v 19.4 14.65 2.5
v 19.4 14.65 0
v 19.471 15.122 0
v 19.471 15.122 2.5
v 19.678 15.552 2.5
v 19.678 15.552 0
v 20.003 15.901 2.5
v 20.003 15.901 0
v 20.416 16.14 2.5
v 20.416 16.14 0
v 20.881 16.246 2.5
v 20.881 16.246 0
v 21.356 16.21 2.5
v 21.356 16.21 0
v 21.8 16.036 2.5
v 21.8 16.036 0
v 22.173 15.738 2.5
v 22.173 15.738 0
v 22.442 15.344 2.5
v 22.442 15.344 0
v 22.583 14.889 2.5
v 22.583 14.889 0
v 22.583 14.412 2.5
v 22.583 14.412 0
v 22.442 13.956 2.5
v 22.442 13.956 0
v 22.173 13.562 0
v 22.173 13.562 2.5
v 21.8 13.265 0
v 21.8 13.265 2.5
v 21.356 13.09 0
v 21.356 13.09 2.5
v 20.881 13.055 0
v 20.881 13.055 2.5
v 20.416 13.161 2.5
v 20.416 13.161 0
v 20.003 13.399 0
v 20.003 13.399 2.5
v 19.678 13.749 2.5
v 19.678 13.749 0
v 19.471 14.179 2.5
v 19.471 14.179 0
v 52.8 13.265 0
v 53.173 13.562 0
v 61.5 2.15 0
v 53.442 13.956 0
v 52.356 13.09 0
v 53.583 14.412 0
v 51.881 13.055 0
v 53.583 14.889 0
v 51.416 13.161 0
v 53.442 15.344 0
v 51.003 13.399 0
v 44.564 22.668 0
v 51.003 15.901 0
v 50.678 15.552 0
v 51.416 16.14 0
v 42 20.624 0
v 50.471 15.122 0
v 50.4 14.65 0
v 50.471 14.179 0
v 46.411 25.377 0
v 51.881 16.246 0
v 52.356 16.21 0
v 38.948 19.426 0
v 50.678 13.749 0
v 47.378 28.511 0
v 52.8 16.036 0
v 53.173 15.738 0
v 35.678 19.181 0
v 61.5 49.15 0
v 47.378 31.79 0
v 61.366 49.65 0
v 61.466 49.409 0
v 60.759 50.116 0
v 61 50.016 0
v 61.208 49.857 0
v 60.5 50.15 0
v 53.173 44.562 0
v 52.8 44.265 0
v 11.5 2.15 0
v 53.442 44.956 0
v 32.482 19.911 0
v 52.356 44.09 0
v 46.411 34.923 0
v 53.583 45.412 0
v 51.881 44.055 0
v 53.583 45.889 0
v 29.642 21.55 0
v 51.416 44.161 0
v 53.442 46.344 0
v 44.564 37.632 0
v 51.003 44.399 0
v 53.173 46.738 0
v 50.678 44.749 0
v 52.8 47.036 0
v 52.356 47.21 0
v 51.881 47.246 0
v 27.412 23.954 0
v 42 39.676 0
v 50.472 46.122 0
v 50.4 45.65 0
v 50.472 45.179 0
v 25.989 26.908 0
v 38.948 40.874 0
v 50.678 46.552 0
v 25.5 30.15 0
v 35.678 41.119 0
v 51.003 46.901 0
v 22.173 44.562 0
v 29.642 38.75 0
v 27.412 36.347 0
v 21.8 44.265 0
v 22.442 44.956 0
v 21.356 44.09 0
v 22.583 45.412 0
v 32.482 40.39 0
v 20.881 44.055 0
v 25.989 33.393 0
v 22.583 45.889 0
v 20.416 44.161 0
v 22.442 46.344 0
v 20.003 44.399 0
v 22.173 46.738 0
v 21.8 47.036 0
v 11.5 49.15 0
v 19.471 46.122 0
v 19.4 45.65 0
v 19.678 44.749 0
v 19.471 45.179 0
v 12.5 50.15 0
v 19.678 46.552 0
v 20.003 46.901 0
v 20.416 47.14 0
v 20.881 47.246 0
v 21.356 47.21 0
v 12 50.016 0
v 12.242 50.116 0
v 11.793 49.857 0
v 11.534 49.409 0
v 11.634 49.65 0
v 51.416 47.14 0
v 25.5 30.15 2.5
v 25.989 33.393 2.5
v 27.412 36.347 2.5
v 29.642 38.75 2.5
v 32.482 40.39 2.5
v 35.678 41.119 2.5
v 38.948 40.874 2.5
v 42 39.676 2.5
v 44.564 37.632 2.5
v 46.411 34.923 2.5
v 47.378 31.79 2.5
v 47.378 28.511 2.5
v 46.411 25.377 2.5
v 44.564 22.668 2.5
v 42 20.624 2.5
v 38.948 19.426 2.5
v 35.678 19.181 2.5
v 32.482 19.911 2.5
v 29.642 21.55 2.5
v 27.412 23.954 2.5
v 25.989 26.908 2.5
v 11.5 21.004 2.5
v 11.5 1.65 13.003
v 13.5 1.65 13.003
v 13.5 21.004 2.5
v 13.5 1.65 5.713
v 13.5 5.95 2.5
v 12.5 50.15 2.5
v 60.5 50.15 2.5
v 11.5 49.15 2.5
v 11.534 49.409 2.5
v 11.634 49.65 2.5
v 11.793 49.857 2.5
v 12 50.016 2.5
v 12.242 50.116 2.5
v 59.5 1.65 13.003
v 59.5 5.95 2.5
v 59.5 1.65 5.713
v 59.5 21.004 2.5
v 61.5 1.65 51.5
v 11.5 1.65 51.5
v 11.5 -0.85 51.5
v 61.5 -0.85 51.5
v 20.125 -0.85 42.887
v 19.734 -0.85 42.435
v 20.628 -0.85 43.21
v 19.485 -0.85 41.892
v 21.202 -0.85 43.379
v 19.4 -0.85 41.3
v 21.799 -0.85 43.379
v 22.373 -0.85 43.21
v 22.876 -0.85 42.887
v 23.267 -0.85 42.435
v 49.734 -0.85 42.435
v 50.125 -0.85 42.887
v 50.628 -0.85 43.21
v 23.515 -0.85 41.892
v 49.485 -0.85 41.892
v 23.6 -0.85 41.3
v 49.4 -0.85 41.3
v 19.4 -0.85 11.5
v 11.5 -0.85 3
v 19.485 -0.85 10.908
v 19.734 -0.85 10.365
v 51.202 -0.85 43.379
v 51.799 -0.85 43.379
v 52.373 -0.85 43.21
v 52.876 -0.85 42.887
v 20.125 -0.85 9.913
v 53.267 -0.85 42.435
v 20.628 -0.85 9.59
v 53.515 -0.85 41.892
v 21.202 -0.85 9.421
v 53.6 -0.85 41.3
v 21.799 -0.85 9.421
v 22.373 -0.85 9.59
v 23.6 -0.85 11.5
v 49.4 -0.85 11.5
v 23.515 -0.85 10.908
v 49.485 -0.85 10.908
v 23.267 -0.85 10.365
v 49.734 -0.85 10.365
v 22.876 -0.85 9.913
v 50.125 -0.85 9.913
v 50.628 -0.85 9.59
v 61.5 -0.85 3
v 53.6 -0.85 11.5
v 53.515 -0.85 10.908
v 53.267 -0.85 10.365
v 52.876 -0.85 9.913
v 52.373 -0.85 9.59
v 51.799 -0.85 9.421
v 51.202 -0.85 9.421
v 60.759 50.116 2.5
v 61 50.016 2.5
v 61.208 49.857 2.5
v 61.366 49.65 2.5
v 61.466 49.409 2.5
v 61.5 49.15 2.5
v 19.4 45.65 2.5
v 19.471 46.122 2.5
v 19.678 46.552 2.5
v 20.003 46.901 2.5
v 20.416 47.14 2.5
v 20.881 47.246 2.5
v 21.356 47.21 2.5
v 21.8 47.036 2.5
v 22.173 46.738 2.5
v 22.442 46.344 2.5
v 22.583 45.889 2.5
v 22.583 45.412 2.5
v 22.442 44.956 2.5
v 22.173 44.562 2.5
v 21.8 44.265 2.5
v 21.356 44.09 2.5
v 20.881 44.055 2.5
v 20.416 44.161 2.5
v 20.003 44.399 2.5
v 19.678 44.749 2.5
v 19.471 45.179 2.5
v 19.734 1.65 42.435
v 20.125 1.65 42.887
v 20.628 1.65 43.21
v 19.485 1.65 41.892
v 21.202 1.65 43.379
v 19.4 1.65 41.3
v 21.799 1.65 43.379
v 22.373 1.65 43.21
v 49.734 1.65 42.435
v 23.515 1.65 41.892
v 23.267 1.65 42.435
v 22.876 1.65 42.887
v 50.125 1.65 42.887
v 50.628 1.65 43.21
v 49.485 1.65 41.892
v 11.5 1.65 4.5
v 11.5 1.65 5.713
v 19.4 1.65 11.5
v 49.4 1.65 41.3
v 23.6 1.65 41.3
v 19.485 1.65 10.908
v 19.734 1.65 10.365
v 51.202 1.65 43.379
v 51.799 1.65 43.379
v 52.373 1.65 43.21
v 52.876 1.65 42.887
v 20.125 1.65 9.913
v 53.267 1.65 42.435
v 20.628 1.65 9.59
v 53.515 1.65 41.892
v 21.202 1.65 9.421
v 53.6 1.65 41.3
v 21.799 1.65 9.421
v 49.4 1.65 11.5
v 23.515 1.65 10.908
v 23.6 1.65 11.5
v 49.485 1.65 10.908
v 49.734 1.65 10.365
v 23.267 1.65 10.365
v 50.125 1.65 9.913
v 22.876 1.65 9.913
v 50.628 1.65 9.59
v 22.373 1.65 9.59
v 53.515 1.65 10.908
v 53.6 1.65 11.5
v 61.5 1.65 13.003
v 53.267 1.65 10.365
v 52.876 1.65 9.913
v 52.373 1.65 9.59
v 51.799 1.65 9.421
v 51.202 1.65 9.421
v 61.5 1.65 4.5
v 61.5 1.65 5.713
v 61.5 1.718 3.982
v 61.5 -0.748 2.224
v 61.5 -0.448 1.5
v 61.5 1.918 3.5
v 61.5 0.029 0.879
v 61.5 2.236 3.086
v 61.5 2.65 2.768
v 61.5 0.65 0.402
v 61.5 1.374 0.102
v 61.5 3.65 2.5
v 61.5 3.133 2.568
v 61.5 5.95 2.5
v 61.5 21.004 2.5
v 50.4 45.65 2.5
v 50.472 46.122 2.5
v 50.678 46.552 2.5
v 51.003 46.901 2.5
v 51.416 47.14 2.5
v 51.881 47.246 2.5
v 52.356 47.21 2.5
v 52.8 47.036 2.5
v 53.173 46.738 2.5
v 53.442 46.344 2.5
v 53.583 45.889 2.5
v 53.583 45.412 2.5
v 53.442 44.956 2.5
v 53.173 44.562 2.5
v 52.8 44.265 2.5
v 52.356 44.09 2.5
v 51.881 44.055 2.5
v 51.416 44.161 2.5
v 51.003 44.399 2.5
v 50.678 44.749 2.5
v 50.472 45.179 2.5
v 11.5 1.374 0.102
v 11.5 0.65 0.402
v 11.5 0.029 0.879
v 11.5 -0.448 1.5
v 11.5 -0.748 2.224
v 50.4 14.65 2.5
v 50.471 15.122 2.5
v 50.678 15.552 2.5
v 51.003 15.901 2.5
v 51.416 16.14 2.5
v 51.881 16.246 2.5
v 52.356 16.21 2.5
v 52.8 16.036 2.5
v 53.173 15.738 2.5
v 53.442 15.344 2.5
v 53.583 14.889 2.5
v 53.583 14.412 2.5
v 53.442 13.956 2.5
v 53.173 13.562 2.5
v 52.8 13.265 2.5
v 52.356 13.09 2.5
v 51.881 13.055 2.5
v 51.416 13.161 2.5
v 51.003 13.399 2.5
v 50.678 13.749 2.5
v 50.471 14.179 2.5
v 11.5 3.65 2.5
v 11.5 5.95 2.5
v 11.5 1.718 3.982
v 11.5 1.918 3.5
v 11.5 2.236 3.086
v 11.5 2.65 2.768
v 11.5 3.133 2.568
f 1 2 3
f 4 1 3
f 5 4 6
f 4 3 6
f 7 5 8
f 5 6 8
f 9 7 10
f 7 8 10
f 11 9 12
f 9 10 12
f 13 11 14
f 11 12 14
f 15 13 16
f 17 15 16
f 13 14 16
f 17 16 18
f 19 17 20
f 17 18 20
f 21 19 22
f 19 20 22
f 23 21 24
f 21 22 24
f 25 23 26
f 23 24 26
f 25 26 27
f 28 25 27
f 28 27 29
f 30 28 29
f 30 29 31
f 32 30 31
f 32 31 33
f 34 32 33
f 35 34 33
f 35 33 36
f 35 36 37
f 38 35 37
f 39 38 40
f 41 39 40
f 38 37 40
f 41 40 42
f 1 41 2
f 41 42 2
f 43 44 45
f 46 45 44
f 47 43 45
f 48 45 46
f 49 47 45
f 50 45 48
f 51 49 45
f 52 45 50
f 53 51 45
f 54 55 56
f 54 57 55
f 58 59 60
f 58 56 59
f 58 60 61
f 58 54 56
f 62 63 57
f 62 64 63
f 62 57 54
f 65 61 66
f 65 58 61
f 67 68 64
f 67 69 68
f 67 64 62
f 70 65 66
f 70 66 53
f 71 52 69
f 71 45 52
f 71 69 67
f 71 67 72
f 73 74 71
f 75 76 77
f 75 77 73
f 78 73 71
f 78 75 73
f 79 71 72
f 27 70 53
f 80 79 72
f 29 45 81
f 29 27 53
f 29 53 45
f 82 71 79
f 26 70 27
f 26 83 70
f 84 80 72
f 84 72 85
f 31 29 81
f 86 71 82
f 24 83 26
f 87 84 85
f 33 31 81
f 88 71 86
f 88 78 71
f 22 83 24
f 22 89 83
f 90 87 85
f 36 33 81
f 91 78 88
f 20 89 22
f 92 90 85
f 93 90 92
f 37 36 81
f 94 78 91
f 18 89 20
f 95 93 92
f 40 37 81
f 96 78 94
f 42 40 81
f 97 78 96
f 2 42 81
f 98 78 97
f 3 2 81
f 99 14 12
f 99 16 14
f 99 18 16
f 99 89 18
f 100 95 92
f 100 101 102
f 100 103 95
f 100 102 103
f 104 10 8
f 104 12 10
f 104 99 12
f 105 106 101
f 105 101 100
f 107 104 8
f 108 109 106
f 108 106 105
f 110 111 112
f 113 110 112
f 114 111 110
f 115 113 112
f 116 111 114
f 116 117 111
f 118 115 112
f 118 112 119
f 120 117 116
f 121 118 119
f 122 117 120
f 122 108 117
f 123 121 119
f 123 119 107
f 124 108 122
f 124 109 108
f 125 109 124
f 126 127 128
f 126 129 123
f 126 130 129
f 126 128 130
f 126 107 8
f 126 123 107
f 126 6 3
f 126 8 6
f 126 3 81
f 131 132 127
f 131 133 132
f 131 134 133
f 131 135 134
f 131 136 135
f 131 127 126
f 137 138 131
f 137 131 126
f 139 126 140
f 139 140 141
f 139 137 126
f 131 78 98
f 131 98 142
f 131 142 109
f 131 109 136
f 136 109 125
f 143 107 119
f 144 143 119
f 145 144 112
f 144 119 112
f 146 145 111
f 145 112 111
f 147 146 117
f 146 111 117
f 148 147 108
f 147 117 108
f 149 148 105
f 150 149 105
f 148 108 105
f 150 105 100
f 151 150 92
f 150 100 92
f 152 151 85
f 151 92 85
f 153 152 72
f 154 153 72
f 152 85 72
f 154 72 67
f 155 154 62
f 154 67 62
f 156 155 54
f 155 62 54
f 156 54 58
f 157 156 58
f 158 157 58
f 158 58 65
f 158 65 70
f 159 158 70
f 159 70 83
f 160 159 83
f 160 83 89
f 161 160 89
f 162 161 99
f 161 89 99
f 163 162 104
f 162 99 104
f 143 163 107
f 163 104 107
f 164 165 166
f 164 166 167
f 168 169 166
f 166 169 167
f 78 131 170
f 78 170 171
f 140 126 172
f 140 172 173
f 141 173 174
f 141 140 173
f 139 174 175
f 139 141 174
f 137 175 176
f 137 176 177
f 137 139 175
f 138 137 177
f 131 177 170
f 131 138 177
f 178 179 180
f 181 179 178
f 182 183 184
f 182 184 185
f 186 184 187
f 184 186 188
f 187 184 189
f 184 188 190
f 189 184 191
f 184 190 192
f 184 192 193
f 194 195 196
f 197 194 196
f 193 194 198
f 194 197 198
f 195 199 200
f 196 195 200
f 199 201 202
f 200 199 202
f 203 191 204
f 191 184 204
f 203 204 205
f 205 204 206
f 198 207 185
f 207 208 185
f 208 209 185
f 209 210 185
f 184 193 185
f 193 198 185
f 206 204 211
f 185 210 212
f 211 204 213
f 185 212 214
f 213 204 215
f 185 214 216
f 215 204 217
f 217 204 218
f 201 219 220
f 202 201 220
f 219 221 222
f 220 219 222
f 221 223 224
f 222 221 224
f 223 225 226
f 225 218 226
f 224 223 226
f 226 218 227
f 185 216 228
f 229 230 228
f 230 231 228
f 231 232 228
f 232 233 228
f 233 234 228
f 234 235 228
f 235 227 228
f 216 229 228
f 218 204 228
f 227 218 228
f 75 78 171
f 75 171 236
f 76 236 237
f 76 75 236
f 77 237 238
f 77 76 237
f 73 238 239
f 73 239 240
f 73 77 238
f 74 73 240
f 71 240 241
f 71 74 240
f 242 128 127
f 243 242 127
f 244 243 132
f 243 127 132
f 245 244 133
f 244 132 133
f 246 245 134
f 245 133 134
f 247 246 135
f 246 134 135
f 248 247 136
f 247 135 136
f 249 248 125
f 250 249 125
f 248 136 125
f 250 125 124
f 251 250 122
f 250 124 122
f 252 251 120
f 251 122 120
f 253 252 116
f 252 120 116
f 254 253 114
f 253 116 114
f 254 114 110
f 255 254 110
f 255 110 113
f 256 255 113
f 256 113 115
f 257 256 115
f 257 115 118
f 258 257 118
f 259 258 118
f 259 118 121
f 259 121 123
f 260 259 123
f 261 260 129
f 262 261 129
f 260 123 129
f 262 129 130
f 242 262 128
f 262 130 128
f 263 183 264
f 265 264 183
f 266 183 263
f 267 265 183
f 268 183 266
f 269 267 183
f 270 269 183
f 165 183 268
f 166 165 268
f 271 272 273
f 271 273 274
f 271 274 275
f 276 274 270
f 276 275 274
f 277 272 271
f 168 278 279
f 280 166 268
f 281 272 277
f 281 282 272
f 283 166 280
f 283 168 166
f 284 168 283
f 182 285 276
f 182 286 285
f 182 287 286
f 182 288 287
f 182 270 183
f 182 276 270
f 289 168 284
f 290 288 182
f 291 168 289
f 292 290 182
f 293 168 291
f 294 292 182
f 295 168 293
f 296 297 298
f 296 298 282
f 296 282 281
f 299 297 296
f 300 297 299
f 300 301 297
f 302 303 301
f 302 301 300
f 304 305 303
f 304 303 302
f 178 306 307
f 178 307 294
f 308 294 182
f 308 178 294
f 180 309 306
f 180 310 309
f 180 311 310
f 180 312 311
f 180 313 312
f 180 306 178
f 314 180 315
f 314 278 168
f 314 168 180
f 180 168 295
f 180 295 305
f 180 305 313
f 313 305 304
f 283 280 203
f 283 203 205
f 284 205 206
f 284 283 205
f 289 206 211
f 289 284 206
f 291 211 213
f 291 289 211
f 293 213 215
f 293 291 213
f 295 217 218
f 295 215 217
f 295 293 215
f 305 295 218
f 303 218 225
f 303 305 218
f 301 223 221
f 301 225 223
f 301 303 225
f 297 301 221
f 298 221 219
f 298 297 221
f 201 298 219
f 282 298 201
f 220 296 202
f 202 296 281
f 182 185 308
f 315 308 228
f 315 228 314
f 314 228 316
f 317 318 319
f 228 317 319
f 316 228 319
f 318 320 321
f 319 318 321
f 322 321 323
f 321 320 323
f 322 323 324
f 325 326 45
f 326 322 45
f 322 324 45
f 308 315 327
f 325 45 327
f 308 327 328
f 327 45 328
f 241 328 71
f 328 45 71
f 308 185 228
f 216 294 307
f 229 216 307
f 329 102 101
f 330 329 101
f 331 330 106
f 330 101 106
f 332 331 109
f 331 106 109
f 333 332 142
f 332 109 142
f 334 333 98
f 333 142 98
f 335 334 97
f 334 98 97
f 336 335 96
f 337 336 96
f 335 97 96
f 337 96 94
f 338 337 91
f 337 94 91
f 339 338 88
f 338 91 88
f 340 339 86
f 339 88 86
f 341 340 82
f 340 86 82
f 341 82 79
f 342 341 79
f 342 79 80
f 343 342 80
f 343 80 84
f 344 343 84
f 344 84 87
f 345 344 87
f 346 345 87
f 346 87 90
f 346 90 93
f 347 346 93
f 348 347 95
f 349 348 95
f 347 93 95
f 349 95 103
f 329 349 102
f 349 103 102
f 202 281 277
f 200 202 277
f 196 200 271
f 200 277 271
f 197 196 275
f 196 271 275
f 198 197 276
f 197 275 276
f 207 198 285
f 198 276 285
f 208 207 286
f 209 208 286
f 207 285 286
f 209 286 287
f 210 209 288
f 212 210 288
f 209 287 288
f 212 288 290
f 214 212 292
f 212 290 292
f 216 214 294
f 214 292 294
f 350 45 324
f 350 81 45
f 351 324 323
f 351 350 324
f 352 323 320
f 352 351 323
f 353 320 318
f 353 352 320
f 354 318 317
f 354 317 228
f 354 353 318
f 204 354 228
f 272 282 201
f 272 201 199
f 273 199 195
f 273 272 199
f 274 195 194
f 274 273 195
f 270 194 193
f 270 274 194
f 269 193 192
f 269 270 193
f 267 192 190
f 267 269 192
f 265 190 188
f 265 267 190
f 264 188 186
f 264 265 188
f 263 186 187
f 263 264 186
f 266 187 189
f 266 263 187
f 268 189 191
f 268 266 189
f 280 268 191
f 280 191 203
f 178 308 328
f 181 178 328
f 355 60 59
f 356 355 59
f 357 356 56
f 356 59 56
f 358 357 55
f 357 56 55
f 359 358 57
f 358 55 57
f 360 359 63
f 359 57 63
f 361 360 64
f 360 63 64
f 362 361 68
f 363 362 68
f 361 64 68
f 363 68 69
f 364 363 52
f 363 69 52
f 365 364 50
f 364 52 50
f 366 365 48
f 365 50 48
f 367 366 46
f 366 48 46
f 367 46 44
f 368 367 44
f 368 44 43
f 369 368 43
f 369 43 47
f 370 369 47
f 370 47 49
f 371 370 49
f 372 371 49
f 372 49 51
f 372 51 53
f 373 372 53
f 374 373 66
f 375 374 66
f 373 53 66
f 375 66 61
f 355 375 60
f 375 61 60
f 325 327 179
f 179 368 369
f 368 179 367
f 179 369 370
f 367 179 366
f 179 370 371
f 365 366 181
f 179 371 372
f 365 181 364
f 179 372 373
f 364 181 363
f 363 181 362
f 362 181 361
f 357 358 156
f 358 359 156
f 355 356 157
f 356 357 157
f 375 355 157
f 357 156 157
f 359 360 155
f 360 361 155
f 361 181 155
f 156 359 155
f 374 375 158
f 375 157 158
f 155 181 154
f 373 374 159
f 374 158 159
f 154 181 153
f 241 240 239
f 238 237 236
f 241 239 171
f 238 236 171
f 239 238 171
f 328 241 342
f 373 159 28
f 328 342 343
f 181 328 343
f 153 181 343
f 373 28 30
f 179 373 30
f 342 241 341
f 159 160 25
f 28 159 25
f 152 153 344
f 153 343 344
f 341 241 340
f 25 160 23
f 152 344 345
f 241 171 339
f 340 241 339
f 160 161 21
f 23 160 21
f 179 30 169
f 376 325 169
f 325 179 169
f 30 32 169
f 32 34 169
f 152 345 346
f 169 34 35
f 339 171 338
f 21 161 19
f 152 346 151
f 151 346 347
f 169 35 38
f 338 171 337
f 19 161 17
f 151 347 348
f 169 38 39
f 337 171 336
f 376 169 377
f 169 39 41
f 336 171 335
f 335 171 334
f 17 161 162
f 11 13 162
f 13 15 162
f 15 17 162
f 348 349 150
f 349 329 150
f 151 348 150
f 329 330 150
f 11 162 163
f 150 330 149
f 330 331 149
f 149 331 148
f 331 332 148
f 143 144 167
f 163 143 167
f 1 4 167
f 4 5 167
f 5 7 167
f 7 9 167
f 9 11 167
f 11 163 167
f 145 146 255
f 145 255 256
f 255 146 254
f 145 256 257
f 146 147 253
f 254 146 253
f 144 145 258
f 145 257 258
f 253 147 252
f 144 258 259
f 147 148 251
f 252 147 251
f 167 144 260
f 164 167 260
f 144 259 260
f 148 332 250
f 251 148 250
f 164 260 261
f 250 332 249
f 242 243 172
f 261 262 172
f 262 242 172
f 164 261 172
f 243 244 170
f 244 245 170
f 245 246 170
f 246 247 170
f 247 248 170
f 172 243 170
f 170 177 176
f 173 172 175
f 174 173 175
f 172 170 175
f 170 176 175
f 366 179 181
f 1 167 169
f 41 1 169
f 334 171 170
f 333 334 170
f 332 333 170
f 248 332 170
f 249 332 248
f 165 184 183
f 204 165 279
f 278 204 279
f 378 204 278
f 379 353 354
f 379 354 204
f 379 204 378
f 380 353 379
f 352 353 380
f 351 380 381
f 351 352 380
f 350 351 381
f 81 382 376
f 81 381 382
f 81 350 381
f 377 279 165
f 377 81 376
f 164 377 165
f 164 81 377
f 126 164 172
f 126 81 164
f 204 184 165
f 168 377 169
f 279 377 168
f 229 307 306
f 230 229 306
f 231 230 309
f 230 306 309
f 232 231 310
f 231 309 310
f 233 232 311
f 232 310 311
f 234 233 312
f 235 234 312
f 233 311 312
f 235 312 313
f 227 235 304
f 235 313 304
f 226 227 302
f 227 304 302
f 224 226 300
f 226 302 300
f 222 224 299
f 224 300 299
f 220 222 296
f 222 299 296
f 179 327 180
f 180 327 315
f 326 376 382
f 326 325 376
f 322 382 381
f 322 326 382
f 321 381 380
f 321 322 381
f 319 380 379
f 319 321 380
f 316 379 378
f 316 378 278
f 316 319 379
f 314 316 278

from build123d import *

# Parameters (mm, degrees)
ESQUISSE1_R             = 11
ESQUISSE1_R_2           = 1.6
BOSS_EXTRU_1_DEPTH      = 2.5
ESQUISSE2_W             = 50
ESQUISSE2_H             = 2.5
BOSS_EXTRU_2_DEPTH      = 49
ENL_V_MAT_EXTRU_1_DEPTH = 94.737929077
CONG_1_R                = 3
CONG_2_R                = 2
BOSS_EXTRU_3_DEPTH      = 2


with BuildPart() as part:
    # Esquisse1 → Boss.-Extru.1 (new body)
    with BuildSketch(Plane(origin=(0, 0, 0), x_dir=(-1, 0, 0), z_dir=(0, 0, -1))):
        with BuildLine():
            Line((-11.5004012, -0.849780391), (-11.5004012, 49.150219609))
            ThreePointArc((-11.5004012, 49.150219609), (-11.793294419, 49.85732639), (-12.5004012, 50.150219609))
            Line((-12.5004012, 50.150219609), (-60.5004012, 50.150219609))
            ThreePointArc((-60.5004012, 50.150219609), (-61.207507981, 49.85732639), (-61.5004012, 49.150219609))
            Line((-61.5004012, 49.150219609), (-61.5004012, -0.849780391))
            Line((-61.5004012, -0.849780391), (-11.5004012, -0.849780391))
        make_face()
        with Locations((-36.5004012, 30.150219609)):
            Circle(ESQUISSE1_R, mode=Mode.SUBTRACT)
        with Locations((-52.0004012, 14.650219609)):
            Circle(ESQUISSE1_R_2, mode=Mode.SUBTRACT)
        with Locations((-52.000444233, 45.650219609)):
            Circle(ESQUISSE1_R_2, mode=Mode.SUBTRACT)
        with Locations((-21.0004012, 14.650219609)):
            Circle(ESQUISSE1_R_2, mode=Mode.SUBTRACT)
        with Locations((-21.0004012, 45.650219609)):
            Circle(ESQUISSE1_R_2, mode=Mode.SUBTRACT)
    extrude(amount=-BOSS_EXTRU_1_DEPTH)

    # Esquisse2 → Boss.-Extru.2 (add)
    with BuildSketch(Plane.XY.offset(2.5)):
        with Locations((36.5004012, 0.400219609)):
            Rectangle(ESQUISSE2_W, ESQUISSE2_H)
    extrude(amount=BOSS_EXTRU_2_DEPTH)

    # Esquisse5 → Enlèv. mat.-Extru.1 (cut, through all)
    with BuildSketch(Plane(origin=(0, 1.650219609, 0), x_dir=(1, 0, 0), z_dir=(0, 1, 0))):
        with BuildLine():
            Line((23.6004012, -11.5), (23.6004012, -41.3))
            ThreePointArc((23.6004012, -41.3), (21.5004012, -43.4), (19.4004012, -41.3))
            Line((19.4004012, -41.3), (19.4004012, -11.5))
            ThreePointArc((19.4004012, -11.5), (21.5004012, -9.4), (23.6004012, -11.5))
        make_face()
        with BuildLine():
            Line((49.4004012, -11.5), (49.4004012, -41.3))
            ThreePointArc((49.4004012, -41.3), (51.5004012, -43.4), (53.6004012, -41.3))
            Line((53.6004012, -41.3), (53.6004012, -11.5))
            ThreePointArc((53.6004012, -11.5), (51.5004012, -9.4), (49.4004012, -11.5))
        make_face()
    extrude(amount=-ENL_V_MAT_EXTRU_1_DEPTH, mode=Mode.SUBTRACT)

    # Congé1
    cong_1_edges = [part.edges().sort_by_distance(p)[0] for p in [
        (36.5004012, -0.849780391, 0),
    ]]
    fillet(cong_1_edges, radius=CONG_1_R)

    # Congé2
    cong_2_edges = [part.edges().sort_by_distance(p)[0] for p in [
        (36.5004012, 1.650219609, 2.5),
    ]]
    fillet(cong_2_edges, radius=CONG_2_R)

    # Esquisse4 → Boss.-Extru.3 (add)
    with BuildSketch(Plane.ZY.offset(-11.5004012)):
        Polygon((1.986701053, 6.637130702), (6.116686164, 1.109304476), (13.296506434, 1.109304476), (1.986701053, 21.949844729), align=None)
    boss_extru_3 = extrude(amount=-BOSS_EXTRU_3_DEPTH)

    # Symétrie1: Boss.-Extru.3 across plane
    add(boss_extru_3.mirror(Plane.ZY.offset(-36.5004012)))


solid = part.part
